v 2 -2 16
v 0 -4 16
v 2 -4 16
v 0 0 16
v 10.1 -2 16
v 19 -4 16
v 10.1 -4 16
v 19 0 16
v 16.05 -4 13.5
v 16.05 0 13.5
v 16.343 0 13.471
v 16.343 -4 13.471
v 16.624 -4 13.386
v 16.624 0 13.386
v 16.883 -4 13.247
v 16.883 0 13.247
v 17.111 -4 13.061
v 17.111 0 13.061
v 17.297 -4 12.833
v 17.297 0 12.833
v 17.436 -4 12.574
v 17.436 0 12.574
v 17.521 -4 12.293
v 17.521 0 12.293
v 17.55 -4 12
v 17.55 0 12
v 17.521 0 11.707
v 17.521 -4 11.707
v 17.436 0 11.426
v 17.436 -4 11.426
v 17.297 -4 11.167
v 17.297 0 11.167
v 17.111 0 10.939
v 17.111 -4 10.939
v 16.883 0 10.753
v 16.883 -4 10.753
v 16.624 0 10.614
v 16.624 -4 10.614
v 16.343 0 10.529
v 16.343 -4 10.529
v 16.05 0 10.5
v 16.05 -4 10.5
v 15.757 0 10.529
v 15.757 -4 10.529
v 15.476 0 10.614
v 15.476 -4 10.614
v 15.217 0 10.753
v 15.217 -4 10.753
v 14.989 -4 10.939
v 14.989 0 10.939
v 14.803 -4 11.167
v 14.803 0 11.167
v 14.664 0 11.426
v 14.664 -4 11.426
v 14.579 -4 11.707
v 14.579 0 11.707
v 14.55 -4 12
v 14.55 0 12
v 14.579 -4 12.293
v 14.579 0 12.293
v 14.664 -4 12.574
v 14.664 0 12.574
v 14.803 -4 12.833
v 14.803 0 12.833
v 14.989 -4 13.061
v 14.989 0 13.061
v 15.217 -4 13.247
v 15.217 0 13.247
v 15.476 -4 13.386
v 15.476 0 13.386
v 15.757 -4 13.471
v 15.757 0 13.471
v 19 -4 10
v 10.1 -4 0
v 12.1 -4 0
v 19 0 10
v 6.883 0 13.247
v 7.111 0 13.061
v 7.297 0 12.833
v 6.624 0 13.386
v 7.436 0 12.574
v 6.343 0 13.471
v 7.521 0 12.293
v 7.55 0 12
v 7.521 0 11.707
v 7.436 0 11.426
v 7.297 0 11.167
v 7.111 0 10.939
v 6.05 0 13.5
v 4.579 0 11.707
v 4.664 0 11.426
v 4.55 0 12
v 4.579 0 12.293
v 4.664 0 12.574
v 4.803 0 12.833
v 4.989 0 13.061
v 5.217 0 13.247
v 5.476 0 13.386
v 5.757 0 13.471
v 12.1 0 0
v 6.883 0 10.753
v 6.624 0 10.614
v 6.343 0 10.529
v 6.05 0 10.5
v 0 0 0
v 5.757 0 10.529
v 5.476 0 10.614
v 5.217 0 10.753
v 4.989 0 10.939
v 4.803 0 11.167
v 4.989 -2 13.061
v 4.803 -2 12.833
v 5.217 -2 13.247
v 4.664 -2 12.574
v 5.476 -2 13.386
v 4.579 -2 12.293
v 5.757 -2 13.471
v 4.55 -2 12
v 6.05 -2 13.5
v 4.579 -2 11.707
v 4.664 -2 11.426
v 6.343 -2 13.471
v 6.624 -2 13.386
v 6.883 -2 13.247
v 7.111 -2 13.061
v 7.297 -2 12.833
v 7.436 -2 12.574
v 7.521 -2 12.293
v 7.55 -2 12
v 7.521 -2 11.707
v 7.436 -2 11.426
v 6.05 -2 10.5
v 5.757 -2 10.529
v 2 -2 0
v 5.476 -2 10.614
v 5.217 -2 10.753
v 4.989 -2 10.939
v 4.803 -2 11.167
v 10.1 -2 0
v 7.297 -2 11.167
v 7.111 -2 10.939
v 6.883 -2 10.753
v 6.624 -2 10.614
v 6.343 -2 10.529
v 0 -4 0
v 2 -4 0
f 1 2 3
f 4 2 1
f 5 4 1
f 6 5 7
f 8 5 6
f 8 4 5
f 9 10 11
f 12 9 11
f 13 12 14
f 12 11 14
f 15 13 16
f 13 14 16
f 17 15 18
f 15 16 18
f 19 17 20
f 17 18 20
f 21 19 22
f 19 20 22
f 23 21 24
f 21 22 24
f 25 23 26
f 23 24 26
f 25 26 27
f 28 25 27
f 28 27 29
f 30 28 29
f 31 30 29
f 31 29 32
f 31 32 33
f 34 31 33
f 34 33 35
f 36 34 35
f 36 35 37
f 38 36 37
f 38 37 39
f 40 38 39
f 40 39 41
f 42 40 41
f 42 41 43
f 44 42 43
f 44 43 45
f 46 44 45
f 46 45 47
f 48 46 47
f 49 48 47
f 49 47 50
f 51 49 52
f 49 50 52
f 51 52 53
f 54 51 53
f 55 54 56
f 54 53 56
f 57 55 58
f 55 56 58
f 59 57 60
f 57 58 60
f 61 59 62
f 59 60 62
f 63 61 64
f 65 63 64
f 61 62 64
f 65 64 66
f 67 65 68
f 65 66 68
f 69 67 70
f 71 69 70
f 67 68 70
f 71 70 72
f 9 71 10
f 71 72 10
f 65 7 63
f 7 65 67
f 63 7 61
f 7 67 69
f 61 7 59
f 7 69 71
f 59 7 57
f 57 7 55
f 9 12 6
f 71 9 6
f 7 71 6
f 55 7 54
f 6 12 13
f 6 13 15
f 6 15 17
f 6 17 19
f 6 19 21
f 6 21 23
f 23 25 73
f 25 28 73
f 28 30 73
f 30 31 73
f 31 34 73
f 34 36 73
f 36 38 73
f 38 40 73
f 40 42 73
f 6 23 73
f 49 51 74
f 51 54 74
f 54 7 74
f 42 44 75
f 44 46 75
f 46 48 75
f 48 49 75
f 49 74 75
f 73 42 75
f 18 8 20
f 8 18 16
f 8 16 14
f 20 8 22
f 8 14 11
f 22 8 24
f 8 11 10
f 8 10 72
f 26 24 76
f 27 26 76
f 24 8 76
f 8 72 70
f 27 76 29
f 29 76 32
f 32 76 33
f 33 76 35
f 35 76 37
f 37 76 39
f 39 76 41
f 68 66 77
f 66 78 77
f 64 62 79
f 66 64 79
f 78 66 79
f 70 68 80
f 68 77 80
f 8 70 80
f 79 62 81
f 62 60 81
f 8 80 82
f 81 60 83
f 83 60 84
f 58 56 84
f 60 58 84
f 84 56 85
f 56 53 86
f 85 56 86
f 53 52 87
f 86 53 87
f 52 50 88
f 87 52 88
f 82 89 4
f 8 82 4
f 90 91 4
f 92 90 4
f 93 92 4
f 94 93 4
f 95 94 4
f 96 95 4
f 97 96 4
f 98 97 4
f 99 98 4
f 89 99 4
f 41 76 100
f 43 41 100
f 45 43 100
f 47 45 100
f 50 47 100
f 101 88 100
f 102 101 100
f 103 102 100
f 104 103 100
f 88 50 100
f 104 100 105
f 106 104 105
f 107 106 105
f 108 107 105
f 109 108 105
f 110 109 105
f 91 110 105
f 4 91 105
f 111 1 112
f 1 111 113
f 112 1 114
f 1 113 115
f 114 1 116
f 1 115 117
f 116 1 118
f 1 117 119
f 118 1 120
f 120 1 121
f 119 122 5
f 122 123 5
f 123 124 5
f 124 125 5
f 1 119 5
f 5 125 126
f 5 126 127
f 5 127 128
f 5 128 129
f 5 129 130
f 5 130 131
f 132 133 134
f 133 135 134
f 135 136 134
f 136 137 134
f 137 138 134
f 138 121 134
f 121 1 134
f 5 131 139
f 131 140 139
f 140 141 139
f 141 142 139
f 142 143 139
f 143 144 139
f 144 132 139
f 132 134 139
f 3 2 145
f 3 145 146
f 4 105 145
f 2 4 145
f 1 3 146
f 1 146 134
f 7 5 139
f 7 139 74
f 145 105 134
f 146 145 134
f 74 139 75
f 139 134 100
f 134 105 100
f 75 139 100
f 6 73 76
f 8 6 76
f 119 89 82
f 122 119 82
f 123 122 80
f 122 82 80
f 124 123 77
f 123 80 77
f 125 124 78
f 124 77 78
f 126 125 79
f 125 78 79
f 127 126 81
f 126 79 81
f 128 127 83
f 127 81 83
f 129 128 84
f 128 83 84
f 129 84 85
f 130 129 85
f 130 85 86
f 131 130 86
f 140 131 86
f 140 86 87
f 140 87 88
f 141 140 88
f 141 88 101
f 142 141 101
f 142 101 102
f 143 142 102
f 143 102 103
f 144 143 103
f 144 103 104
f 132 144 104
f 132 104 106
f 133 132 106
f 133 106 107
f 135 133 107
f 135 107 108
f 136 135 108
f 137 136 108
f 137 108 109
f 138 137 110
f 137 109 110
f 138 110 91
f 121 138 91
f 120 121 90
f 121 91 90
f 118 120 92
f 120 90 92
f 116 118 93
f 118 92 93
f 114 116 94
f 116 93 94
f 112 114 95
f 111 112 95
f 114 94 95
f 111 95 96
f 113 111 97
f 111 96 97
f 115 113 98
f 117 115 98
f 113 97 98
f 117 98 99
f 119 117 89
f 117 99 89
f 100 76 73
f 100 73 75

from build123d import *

# Parameters (mm, degrees)
BOSS_EXTRU_1_DEPTH      = 16
ESQUISSE2_R             = 1.5
ENL_V_MAT_EXTRU_1_DEPTH = 26.159491251


with BuildPart() as part:
    # Esquisse1 → Boss.-Extru.1 (new body)
    with BuildSketch(Plane.XY):
        Polygon((10.1, -4), (19, -4), (19, 0), (0, 0), (0, -4), (2, -4), (2, -2), (10.1, -2), align=None)
    extrude(amount=BOSS_EXTRU_1_DEPTH)

    # Esquisse2 → Enlèv. mat.-Extru.1 (cut, through all)
    with BuildSketch(Plane(origin=(0, 0, 0), x_dir=(1, 0, 0), z_dir=(0, 1, 0))):
        with Locations(Location((6.05, -12, 0), (0, 0, 270))):
            Circle(ESQUISSE2_R)
        with Locations(Location((16.05, -12, 0), (0, 0, 270))):
            Circle(ESQUISSE2_R)
        Polygon((12.1, 0), (19, 0), (19, -10), align=None)
    extrude(amount=-ENL_V_MAT_EXTRU_1_DEPTH, mode=Mode.SUBTRACT)


solid = part.part
